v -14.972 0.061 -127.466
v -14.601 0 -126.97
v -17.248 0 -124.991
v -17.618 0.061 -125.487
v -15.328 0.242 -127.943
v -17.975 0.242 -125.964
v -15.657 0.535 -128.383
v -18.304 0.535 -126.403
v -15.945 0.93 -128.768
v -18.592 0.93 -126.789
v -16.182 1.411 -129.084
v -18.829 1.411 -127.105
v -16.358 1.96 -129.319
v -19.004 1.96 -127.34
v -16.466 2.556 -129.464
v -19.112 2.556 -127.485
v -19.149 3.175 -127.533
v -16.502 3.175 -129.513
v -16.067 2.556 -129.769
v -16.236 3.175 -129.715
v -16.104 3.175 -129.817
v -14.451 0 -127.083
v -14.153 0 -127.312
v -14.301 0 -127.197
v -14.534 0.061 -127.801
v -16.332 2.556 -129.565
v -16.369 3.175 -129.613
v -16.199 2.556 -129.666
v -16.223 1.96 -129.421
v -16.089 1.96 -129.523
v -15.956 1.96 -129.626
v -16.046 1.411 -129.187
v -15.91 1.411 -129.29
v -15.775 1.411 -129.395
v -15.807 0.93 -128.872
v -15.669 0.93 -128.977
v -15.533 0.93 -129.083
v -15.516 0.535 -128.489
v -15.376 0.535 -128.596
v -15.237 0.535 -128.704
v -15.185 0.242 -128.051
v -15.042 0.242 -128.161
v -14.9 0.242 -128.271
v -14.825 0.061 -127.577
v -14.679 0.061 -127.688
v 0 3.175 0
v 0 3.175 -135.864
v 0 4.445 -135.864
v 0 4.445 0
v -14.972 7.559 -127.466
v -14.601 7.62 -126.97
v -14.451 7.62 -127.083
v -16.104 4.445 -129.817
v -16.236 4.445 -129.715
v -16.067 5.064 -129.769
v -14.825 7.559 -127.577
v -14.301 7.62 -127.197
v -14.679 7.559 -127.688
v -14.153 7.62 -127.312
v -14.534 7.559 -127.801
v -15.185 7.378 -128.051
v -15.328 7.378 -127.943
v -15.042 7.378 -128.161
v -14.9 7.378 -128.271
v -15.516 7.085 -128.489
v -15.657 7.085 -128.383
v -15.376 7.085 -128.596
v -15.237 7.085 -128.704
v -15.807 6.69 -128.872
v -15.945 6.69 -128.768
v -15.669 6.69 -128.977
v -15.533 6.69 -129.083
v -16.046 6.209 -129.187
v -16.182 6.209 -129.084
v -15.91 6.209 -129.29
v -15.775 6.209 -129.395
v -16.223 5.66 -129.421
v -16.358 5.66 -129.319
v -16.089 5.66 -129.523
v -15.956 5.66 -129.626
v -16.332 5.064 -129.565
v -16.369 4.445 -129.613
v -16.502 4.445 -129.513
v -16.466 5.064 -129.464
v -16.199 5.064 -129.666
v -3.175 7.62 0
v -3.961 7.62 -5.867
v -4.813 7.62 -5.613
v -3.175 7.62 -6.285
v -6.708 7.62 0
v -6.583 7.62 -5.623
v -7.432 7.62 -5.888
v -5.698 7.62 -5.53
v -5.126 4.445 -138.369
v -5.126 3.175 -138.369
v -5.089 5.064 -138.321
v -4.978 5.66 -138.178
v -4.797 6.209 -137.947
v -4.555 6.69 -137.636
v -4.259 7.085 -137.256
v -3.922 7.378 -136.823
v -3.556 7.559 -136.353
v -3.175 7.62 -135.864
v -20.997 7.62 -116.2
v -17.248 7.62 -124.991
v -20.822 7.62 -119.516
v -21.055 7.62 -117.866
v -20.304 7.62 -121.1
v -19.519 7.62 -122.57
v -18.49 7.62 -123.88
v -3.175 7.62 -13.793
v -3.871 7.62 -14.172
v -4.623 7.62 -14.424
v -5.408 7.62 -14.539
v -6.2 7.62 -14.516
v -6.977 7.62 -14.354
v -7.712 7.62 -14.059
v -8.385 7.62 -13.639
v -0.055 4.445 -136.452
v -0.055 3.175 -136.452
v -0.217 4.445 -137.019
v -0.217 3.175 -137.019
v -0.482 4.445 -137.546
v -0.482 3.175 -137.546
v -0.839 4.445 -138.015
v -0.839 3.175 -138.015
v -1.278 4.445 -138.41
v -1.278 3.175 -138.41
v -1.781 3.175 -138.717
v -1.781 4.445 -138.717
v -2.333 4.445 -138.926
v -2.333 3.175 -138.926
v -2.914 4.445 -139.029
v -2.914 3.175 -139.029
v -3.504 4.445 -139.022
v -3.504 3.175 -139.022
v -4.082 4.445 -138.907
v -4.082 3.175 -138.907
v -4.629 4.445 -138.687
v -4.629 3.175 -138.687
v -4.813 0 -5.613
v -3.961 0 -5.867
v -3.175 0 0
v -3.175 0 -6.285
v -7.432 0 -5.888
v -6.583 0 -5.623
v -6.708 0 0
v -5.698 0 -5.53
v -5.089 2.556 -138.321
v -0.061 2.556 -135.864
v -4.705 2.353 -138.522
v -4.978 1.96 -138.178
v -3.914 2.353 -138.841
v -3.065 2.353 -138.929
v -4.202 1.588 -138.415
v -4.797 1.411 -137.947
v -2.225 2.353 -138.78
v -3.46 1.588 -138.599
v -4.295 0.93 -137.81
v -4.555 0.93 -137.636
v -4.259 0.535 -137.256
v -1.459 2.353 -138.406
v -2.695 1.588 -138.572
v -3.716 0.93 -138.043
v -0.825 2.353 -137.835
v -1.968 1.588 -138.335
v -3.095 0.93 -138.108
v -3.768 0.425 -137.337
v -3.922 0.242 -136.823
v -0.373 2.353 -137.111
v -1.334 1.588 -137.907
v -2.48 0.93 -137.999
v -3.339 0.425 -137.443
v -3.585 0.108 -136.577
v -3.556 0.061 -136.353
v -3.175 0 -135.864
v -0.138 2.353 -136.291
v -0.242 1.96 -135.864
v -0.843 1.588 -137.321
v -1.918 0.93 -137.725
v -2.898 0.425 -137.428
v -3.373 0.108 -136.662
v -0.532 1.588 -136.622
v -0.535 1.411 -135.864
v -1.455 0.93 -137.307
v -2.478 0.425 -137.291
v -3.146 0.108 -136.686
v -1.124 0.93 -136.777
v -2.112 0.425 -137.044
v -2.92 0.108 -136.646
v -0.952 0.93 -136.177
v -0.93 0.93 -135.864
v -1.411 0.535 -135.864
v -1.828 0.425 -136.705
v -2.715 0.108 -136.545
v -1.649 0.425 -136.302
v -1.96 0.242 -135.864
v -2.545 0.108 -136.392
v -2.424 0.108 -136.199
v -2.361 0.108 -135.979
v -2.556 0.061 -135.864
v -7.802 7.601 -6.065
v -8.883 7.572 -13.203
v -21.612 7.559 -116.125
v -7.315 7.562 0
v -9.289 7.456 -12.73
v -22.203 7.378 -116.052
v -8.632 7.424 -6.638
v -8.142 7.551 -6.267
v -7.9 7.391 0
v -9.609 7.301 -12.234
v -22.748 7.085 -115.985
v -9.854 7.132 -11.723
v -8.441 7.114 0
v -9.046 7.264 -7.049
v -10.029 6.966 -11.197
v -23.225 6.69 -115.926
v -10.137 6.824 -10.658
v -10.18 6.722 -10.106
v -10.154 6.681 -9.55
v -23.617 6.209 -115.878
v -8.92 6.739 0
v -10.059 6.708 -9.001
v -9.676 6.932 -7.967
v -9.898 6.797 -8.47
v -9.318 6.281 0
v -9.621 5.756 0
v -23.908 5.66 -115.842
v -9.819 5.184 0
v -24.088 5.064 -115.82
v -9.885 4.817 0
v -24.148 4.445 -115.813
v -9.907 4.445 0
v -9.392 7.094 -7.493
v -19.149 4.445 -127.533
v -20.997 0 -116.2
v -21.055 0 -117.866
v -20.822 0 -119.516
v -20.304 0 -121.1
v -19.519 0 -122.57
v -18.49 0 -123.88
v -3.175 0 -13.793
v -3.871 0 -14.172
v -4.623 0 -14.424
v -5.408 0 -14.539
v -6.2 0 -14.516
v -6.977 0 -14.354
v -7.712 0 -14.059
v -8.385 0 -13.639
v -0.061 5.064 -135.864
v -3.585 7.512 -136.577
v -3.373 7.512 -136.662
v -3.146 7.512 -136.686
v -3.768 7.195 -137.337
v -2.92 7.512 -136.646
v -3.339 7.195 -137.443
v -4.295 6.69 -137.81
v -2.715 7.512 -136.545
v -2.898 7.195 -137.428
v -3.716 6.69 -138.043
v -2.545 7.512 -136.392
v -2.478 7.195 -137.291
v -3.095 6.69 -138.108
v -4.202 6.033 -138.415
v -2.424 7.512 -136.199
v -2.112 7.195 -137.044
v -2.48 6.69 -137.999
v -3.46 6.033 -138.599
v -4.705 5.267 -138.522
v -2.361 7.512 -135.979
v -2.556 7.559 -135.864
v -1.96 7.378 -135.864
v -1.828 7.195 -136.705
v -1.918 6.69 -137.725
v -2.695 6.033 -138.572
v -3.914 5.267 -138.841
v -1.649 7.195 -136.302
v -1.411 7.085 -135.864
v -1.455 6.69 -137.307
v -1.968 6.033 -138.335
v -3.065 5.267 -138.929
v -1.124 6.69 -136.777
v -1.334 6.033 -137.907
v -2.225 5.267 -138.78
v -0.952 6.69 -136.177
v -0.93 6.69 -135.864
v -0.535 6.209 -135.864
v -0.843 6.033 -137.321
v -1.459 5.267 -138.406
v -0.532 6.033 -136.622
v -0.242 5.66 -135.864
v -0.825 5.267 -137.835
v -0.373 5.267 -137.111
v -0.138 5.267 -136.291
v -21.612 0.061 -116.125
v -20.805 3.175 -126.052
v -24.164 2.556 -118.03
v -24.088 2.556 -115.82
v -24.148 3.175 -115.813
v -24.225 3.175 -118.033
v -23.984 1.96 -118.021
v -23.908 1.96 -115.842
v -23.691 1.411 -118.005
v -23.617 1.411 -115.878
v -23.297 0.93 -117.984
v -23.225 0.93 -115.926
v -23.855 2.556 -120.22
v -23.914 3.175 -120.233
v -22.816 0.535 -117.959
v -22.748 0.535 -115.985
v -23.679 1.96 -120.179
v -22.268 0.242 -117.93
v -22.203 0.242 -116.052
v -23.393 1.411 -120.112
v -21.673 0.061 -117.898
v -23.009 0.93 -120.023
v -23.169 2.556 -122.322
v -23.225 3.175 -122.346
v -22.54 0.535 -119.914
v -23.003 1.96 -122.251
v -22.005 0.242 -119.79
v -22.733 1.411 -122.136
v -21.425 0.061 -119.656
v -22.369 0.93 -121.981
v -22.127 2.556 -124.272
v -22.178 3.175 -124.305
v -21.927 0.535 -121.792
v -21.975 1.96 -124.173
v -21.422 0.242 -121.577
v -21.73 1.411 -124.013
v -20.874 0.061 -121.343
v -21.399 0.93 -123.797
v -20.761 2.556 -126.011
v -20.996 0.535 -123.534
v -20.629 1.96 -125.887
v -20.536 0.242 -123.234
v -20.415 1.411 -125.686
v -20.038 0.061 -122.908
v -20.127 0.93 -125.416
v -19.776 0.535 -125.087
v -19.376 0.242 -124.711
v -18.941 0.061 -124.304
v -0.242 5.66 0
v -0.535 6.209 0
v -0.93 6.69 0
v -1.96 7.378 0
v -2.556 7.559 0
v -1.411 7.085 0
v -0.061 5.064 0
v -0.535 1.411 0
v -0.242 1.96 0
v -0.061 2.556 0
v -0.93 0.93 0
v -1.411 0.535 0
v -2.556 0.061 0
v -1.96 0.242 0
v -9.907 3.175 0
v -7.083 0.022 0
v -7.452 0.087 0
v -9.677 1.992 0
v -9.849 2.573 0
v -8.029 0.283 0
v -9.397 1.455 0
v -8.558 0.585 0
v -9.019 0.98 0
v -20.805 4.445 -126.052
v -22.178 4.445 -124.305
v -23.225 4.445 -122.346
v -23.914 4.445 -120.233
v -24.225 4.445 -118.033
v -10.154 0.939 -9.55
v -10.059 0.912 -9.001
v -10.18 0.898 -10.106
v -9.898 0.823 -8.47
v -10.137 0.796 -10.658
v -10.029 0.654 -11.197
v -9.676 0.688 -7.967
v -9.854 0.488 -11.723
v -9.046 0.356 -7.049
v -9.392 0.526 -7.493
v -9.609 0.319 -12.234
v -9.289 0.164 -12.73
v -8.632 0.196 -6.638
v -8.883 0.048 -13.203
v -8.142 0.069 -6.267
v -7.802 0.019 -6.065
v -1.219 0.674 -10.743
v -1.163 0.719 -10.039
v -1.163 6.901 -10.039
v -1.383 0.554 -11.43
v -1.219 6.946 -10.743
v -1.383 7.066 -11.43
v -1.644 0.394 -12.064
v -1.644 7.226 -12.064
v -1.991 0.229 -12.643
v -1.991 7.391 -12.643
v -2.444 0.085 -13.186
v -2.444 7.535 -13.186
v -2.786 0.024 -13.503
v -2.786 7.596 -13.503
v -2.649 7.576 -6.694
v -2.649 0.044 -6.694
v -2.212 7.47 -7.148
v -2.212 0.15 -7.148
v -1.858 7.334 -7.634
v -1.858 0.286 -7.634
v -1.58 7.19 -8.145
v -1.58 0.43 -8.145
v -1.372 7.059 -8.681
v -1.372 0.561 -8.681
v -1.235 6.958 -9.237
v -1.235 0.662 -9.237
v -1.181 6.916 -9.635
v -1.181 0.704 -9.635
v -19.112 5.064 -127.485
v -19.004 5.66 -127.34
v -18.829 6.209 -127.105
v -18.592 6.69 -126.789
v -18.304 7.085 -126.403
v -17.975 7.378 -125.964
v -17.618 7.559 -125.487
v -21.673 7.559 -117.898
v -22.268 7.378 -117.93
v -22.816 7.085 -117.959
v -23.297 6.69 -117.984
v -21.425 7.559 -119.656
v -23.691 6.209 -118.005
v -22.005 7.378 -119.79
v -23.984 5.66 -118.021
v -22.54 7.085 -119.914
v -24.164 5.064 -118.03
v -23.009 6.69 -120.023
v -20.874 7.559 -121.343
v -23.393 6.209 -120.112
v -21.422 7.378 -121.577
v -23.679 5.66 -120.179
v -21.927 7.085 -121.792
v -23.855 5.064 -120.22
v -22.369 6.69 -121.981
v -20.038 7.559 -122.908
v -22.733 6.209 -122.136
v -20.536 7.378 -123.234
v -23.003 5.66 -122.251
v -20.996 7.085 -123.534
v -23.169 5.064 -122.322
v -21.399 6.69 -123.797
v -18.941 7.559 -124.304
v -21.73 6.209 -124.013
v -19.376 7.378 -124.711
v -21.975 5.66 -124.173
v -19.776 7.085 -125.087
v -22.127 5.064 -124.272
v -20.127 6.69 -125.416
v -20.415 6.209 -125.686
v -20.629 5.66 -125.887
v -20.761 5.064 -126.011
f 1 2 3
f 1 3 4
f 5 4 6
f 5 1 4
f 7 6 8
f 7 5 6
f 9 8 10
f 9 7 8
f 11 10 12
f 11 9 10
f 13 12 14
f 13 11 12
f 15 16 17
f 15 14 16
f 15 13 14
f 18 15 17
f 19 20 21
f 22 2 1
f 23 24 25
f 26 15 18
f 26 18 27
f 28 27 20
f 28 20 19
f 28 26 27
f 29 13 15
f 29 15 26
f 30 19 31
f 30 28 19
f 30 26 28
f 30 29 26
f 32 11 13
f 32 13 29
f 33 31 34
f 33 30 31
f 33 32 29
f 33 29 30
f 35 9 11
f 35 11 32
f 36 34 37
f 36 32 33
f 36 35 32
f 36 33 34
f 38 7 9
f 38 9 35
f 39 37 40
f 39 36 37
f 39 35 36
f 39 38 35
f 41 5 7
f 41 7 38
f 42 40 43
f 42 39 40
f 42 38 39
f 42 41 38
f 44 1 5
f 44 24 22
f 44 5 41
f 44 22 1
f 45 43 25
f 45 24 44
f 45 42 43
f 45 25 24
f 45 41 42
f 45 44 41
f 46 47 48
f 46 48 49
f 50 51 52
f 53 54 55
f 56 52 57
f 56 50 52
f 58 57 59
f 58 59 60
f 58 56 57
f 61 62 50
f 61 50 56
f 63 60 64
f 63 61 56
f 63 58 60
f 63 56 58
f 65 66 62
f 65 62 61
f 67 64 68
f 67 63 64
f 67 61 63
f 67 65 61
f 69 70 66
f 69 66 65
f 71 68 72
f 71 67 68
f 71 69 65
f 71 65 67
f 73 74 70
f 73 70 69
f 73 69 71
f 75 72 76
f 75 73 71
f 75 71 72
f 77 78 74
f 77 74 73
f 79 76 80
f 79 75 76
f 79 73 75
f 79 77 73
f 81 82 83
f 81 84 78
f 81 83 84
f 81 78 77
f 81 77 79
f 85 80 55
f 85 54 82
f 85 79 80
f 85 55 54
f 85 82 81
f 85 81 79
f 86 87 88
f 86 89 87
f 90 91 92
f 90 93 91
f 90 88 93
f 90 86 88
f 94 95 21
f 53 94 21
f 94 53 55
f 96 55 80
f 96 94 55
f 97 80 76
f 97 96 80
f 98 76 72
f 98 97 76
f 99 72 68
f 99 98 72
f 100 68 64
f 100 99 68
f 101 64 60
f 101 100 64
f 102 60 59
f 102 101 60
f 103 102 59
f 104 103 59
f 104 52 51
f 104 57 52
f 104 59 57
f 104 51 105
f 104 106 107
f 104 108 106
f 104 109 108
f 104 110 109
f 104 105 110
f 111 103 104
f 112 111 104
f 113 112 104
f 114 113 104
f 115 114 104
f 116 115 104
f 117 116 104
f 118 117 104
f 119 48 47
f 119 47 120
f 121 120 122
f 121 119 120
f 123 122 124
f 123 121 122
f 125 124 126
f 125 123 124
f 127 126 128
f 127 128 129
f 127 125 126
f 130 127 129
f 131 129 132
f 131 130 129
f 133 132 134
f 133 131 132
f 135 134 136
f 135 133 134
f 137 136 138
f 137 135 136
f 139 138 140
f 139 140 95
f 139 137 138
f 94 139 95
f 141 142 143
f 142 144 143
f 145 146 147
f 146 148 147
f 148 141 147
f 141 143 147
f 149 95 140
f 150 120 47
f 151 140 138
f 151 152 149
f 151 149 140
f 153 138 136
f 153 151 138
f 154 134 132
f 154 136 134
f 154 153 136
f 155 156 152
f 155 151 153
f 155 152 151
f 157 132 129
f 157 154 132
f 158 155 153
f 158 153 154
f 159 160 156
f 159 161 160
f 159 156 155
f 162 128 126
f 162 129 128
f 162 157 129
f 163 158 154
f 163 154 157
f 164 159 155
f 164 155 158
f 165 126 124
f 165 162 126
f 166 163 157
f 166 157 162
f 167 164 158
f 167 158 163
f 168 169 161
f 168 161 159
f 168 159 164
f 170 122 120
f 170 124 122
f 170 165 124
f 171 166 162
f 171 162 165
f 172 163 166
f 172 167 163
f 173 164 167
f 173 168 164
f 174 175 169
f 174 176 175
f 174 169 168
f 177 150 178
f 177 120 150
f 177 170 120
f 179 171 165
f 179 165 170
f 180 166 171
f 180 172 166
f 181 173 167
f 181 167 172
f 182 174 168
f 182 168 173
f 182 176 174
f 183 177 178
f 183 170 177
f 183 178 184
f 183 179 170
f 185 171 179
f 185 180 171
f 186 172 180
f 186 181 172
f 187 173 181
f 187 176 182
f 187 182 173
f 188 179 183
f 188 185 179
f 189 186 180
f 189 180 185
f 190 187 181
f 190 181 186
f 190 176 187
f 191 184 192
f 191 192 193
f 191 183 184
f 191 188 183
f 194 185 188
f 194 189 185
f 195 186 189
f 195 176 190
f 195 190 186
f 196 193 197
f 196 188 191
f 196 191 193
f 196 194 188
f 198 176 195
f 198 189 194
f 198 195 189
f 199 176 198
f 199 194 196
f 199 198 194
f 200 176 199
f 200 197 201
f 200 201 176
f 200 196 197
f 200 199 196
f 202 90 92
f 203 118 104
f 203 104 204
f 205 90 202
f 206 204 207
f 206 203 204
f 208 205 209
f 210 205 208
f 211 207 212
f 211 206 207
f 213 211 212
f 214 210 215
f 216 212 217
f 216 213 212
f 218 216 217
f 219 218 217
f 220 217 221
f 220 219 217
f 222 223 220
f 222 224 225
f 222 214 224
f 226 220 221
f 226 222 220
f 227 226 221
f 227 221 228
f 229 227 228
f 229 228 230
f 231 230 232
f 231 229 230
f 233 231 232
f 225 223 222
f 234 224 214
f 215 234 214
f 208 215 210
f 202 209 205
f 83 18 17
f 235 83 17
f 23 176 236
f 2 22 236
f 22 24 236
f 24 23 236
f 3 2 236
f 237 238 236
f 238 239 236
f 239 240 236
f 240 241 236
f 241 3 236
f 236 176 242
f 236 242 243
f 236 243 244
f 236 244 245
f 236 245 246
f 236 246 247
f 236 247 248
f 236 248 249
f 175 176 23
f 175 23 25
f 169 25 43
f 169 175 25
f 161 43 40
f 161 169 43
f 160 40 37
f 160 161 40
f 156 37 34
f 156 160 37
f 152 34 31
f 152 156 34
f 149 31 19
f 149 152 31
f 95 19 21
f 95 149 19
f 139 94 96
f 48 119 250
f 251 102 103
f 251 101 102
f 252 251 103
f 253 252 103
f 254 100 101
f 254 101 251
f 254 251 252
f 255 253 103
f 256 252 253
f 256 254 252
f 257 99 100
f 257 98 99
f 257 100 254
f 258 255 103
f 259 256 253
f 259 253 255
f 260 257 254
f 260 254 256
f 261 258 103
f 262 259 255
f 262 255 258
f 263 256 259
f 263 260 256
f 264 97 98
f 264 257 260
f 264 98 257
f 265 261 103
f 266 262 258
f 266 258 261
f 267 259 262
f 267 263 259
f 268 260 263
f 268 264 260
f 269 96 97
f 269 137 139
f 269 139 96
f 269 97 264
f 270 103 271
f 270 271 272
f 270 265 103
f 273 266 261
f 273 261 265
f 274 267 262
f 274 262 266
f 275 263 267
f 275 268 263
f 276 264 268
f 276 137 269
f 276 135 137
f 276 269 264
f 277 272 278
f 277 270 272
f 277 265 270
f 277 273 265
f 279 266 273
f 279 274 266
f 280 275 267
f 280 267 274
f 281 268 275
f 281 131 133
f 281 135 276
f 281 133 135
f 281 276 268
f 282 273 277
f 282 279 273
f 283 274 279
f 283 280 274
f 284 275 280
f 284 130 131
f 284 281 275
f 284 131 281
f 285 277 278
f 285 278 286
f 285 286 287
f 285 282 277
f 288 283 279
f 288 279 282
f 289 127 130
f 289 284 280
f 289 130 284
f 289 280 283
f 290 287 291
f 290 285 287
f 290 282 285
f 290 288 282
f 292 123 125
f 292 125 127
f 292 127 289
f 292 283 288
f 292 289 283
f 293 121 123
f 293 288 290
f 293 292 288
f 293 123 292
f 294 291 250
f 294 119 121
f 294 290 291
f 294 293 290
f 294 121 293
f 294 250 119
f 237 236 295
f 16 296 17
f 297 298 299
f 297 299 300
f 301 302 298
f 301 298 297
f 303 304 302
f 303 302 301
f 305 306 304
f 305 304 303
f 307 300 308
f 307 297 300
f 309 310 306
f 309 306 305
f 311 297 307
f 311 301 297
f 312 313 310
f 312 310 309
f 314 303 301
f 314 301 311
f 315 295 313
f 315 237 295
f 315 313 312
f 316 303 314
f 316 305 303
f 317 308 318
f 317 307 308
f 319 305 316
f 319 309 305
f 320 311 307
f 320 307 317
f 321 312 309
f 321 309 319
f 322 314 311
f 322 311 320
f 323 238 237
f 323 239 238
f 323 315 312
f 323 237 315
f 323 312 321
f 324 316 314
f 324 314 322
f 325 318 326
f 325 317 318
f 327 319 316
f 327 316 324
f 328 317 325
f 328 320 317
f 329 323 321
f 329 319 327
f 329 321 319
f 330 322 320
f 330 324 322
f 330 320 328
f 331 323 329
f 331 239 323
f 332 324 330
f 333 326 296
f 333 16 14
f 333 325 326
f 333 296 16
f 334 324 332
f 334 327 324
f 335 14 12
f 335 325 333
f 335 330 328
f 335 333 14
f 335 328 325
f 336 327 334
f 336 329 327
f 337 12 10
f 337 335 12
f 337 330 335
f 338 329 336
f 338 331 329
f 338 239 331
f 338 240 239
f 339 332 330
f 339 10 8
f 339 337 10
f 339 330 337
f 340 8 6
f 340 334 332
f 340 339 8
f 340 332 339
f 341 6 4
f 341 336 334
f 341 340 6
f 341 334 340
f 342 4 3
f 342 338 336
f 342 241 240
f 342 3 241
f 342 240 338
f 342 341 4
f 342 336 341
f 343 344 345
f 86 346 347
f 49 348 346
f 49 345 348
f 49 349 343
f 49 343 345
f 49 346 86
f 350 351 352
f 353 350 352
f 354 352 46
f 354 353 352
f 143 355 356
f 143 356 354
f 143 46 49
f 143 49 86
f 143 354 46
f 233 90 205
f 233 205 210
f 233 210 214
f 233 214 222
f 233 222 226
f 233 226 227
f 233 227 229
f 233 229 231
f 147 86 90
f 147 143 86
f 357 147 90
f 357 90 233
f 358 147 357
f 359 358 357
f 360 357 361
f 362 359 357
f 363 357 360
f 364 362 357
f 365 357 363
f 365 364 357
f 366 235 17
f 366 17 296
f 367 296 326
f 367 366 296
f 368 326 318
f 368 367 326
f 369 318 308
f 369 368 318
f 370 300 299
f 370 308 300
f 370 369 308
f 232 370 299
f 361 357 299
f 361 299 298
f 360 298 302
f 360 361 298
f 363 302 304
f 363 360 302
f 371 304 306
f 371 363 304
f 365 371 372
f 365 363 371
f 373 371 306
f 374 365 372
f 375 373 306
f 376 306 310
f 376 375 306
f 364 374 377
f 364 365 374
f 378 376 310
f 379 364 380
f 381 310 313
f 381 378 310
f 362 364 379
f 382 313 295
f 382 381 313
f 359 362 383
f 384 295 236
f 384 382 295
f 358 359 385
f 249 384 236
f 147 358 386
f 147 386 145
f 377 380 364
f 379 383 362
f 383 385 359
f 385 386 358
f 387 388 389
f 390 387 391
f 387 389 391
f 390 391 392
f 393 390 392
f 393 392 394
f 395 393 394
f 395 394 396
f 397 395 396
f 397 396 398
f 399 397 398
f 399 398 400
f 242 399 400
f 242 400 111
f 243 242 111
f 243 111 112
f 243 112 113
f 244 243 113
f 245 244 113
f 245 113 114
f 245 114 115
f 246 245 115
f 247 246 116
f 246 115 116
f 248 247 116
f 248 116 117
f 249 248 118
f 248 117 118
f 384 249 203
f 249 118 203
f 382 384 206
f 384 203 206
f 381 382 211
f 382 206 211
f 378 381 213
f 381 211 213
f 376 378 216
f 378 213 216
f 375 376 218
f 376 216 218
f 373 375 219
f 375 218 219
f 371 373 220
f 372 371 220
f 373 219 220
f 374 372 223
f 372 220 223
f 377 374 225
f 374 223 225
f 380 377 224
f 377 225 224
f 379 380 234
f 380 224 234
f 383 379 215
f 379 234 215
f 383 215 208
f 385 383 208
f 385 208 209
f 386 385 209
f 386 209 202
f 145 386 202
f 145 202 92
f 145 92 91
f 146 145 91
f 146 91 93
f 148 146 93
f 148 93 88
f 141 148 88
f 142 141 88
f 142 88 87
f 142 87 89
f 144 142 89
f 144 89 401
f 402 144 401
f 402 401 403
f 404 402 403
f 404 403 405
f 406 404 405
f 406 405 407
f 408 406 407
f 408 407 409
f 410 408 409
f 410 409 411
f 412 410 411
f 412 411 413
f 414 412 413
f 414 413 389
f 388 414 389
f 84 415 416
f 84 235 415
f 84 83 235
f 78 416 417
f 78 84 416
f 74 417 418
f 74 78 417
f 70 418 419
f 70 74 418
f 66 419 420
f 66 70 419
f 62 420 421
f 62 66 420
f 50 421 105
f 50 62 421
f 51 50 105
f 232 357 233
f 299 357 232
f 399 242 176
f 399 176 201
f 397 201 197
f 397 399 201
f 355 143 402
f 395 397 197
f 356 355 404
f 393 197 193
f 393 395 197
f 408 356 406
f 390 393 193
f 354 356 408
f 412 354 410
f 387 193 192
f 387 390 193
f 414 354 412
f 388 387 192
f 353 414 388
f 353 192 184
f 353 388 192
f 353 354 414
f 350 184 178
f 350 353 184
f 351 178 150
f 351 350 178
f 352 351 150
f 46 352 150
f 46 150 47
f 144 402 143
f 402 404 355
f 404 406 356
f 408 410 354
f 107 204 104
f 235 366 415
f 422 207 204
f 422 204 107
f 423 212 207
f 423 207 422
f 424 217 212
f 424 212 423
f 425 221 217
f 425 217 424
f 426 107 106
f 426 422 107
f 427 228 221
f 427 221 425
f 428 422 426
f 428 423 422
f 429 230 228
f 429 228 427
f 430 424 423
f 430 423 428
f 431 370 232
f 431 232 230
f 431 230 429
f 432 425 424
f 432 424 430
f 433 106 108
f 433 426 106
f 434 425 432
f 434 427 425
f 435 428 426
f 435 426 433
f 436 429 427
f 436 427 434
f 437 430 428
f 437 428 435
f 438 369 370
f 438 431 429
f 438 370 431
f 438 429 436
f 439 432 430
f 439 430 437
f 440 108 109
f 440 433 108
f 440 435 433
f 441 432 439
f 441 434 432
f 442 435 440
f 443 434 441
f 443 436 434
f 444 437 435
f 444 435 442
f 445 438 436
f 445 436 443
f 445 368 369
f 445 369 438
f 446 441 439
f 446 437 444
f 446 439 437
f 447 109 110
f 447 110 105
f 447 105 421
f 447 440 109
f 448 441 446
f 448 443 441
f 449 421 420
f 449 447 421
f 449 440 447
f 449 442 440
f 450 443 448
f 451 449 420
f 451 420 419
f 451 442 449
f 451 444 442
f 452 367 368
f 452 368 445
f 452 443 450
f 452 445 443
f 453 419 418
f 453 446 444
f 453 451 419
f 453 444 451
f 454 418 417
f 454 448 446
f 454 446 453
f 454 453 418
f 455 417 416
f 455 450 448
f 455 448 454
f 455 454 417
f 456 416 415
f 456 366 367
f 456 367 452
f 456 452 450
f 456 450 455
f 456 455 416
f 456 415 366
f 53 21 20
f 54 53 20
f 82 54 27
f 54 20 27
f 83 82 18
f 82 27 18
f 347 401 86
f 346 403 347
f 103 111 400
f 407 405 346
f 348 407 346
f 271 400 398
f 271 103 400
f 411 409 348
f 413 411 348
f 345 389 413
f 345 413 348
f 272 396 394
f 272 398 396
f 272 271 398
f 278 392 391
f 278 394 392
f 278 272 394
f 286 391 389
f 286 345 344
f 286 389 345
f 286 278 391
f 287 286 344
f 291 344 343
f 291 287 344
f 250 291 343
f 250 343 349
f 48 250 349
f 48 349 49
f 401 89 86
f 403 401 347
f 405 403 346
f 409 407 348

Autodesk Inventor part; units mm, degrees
ref_plane "YZ Plane" through (0, 0, 0) normal (1, 0, 0) x (0, 1, 0)
ref_plane "XZ Plane" through (0, 0, 0) normal (0, 1, 0) x (-1, 0, 0)
ref_plane "XY Plane" through (0, 0, 0) normal (0, 0, 1) x (1, 0, 0)
sketch "Sketch1" plane through (0, 0, 0) normal (0, 1, 0) x (-1, 0, 0)
  line L0 (0, 0) -> (12.7, 0)
  line L1 (0, -129.6628) -> (0, 0)
  line L2 (0, -129.6628) -> (0, -142.3628)
  line L3 (0, -142.3628) -> (16.3017, -129.6628)
  line L4 (0, 0) -> (6.35, 0)
  line L5 (16.3017, -129.6628) -> (25.047, -123.1227)
  line L6 (6.35, 0) -> (18.1234, 0)
  line L7 (9.9069, 0) -> (25.047, -123.1227)
  circle A0 centre (4.9306, -5.8204) radius 4.445
  dimension "d10" = 8.89
sketch "Sketch2" plane through (0, 0, 0) normal (0, 1, 0) x (-1, 0, 0)
  point P0 (0, 0)
extrude "Extrusion1" add sketch "Sketch1" along normal blind 7.62 contours L0 L7 L5 L3 L2 L1 | A0
fillet "Fillet1" radius 25.4 1 edges at (-16.3017, 3.81, -129.6628)
sketch "Sketch3" plane through (0, 7.62, 0) normal (0, 1, 0) x (1, 0, 0)
  point P0 (0, 0)
sketch "Sketch4" plane through (0, 7.62, 0) normal (0, 1, 0) x (1, 0, 0)
  point P0 (0, 0)
sketch "Sketch5" plane through (0, 7.62, 0) normal (0, 1, 0) x (1, 0, 0)
  circle A0 centre (-5.6716, 10.0387) radius 4.5085
  point P0 (0, 0)
  dimension "d11" = 9.017
extrude "Extrusion2" cut sketch "Sketch5" against normal through all
fillet "Fillet2" radius 12.7 1 edges at (-25.047, 3.81, -123.1227)
fillet "Fillet3" radius 3.175 1 edges at (0, 3.81, -142.3628)
fillet "Fillet4" radius 3.175 12 edges at (-1.7812, 0, -138.7172) (-10.6152, 0, -134.0929) (-17.8257, 0, -128.5231) (-23.2248, 0, -122.3455) (-17.0275, 0, -57.9065) (0, 0, -67.9322) (-1.7812, 7.62, -138.7172) (-10.6152, 7.62, -134.0929) (-17.8257, 7.62, -128.5231) (-23.2248, 7.62, -122.3455) (-17.0275, 7.62, -57.9065) (0, 7.62, -67.9322)
properties part number "cock clamp" material "PC/ABS Plastic"
